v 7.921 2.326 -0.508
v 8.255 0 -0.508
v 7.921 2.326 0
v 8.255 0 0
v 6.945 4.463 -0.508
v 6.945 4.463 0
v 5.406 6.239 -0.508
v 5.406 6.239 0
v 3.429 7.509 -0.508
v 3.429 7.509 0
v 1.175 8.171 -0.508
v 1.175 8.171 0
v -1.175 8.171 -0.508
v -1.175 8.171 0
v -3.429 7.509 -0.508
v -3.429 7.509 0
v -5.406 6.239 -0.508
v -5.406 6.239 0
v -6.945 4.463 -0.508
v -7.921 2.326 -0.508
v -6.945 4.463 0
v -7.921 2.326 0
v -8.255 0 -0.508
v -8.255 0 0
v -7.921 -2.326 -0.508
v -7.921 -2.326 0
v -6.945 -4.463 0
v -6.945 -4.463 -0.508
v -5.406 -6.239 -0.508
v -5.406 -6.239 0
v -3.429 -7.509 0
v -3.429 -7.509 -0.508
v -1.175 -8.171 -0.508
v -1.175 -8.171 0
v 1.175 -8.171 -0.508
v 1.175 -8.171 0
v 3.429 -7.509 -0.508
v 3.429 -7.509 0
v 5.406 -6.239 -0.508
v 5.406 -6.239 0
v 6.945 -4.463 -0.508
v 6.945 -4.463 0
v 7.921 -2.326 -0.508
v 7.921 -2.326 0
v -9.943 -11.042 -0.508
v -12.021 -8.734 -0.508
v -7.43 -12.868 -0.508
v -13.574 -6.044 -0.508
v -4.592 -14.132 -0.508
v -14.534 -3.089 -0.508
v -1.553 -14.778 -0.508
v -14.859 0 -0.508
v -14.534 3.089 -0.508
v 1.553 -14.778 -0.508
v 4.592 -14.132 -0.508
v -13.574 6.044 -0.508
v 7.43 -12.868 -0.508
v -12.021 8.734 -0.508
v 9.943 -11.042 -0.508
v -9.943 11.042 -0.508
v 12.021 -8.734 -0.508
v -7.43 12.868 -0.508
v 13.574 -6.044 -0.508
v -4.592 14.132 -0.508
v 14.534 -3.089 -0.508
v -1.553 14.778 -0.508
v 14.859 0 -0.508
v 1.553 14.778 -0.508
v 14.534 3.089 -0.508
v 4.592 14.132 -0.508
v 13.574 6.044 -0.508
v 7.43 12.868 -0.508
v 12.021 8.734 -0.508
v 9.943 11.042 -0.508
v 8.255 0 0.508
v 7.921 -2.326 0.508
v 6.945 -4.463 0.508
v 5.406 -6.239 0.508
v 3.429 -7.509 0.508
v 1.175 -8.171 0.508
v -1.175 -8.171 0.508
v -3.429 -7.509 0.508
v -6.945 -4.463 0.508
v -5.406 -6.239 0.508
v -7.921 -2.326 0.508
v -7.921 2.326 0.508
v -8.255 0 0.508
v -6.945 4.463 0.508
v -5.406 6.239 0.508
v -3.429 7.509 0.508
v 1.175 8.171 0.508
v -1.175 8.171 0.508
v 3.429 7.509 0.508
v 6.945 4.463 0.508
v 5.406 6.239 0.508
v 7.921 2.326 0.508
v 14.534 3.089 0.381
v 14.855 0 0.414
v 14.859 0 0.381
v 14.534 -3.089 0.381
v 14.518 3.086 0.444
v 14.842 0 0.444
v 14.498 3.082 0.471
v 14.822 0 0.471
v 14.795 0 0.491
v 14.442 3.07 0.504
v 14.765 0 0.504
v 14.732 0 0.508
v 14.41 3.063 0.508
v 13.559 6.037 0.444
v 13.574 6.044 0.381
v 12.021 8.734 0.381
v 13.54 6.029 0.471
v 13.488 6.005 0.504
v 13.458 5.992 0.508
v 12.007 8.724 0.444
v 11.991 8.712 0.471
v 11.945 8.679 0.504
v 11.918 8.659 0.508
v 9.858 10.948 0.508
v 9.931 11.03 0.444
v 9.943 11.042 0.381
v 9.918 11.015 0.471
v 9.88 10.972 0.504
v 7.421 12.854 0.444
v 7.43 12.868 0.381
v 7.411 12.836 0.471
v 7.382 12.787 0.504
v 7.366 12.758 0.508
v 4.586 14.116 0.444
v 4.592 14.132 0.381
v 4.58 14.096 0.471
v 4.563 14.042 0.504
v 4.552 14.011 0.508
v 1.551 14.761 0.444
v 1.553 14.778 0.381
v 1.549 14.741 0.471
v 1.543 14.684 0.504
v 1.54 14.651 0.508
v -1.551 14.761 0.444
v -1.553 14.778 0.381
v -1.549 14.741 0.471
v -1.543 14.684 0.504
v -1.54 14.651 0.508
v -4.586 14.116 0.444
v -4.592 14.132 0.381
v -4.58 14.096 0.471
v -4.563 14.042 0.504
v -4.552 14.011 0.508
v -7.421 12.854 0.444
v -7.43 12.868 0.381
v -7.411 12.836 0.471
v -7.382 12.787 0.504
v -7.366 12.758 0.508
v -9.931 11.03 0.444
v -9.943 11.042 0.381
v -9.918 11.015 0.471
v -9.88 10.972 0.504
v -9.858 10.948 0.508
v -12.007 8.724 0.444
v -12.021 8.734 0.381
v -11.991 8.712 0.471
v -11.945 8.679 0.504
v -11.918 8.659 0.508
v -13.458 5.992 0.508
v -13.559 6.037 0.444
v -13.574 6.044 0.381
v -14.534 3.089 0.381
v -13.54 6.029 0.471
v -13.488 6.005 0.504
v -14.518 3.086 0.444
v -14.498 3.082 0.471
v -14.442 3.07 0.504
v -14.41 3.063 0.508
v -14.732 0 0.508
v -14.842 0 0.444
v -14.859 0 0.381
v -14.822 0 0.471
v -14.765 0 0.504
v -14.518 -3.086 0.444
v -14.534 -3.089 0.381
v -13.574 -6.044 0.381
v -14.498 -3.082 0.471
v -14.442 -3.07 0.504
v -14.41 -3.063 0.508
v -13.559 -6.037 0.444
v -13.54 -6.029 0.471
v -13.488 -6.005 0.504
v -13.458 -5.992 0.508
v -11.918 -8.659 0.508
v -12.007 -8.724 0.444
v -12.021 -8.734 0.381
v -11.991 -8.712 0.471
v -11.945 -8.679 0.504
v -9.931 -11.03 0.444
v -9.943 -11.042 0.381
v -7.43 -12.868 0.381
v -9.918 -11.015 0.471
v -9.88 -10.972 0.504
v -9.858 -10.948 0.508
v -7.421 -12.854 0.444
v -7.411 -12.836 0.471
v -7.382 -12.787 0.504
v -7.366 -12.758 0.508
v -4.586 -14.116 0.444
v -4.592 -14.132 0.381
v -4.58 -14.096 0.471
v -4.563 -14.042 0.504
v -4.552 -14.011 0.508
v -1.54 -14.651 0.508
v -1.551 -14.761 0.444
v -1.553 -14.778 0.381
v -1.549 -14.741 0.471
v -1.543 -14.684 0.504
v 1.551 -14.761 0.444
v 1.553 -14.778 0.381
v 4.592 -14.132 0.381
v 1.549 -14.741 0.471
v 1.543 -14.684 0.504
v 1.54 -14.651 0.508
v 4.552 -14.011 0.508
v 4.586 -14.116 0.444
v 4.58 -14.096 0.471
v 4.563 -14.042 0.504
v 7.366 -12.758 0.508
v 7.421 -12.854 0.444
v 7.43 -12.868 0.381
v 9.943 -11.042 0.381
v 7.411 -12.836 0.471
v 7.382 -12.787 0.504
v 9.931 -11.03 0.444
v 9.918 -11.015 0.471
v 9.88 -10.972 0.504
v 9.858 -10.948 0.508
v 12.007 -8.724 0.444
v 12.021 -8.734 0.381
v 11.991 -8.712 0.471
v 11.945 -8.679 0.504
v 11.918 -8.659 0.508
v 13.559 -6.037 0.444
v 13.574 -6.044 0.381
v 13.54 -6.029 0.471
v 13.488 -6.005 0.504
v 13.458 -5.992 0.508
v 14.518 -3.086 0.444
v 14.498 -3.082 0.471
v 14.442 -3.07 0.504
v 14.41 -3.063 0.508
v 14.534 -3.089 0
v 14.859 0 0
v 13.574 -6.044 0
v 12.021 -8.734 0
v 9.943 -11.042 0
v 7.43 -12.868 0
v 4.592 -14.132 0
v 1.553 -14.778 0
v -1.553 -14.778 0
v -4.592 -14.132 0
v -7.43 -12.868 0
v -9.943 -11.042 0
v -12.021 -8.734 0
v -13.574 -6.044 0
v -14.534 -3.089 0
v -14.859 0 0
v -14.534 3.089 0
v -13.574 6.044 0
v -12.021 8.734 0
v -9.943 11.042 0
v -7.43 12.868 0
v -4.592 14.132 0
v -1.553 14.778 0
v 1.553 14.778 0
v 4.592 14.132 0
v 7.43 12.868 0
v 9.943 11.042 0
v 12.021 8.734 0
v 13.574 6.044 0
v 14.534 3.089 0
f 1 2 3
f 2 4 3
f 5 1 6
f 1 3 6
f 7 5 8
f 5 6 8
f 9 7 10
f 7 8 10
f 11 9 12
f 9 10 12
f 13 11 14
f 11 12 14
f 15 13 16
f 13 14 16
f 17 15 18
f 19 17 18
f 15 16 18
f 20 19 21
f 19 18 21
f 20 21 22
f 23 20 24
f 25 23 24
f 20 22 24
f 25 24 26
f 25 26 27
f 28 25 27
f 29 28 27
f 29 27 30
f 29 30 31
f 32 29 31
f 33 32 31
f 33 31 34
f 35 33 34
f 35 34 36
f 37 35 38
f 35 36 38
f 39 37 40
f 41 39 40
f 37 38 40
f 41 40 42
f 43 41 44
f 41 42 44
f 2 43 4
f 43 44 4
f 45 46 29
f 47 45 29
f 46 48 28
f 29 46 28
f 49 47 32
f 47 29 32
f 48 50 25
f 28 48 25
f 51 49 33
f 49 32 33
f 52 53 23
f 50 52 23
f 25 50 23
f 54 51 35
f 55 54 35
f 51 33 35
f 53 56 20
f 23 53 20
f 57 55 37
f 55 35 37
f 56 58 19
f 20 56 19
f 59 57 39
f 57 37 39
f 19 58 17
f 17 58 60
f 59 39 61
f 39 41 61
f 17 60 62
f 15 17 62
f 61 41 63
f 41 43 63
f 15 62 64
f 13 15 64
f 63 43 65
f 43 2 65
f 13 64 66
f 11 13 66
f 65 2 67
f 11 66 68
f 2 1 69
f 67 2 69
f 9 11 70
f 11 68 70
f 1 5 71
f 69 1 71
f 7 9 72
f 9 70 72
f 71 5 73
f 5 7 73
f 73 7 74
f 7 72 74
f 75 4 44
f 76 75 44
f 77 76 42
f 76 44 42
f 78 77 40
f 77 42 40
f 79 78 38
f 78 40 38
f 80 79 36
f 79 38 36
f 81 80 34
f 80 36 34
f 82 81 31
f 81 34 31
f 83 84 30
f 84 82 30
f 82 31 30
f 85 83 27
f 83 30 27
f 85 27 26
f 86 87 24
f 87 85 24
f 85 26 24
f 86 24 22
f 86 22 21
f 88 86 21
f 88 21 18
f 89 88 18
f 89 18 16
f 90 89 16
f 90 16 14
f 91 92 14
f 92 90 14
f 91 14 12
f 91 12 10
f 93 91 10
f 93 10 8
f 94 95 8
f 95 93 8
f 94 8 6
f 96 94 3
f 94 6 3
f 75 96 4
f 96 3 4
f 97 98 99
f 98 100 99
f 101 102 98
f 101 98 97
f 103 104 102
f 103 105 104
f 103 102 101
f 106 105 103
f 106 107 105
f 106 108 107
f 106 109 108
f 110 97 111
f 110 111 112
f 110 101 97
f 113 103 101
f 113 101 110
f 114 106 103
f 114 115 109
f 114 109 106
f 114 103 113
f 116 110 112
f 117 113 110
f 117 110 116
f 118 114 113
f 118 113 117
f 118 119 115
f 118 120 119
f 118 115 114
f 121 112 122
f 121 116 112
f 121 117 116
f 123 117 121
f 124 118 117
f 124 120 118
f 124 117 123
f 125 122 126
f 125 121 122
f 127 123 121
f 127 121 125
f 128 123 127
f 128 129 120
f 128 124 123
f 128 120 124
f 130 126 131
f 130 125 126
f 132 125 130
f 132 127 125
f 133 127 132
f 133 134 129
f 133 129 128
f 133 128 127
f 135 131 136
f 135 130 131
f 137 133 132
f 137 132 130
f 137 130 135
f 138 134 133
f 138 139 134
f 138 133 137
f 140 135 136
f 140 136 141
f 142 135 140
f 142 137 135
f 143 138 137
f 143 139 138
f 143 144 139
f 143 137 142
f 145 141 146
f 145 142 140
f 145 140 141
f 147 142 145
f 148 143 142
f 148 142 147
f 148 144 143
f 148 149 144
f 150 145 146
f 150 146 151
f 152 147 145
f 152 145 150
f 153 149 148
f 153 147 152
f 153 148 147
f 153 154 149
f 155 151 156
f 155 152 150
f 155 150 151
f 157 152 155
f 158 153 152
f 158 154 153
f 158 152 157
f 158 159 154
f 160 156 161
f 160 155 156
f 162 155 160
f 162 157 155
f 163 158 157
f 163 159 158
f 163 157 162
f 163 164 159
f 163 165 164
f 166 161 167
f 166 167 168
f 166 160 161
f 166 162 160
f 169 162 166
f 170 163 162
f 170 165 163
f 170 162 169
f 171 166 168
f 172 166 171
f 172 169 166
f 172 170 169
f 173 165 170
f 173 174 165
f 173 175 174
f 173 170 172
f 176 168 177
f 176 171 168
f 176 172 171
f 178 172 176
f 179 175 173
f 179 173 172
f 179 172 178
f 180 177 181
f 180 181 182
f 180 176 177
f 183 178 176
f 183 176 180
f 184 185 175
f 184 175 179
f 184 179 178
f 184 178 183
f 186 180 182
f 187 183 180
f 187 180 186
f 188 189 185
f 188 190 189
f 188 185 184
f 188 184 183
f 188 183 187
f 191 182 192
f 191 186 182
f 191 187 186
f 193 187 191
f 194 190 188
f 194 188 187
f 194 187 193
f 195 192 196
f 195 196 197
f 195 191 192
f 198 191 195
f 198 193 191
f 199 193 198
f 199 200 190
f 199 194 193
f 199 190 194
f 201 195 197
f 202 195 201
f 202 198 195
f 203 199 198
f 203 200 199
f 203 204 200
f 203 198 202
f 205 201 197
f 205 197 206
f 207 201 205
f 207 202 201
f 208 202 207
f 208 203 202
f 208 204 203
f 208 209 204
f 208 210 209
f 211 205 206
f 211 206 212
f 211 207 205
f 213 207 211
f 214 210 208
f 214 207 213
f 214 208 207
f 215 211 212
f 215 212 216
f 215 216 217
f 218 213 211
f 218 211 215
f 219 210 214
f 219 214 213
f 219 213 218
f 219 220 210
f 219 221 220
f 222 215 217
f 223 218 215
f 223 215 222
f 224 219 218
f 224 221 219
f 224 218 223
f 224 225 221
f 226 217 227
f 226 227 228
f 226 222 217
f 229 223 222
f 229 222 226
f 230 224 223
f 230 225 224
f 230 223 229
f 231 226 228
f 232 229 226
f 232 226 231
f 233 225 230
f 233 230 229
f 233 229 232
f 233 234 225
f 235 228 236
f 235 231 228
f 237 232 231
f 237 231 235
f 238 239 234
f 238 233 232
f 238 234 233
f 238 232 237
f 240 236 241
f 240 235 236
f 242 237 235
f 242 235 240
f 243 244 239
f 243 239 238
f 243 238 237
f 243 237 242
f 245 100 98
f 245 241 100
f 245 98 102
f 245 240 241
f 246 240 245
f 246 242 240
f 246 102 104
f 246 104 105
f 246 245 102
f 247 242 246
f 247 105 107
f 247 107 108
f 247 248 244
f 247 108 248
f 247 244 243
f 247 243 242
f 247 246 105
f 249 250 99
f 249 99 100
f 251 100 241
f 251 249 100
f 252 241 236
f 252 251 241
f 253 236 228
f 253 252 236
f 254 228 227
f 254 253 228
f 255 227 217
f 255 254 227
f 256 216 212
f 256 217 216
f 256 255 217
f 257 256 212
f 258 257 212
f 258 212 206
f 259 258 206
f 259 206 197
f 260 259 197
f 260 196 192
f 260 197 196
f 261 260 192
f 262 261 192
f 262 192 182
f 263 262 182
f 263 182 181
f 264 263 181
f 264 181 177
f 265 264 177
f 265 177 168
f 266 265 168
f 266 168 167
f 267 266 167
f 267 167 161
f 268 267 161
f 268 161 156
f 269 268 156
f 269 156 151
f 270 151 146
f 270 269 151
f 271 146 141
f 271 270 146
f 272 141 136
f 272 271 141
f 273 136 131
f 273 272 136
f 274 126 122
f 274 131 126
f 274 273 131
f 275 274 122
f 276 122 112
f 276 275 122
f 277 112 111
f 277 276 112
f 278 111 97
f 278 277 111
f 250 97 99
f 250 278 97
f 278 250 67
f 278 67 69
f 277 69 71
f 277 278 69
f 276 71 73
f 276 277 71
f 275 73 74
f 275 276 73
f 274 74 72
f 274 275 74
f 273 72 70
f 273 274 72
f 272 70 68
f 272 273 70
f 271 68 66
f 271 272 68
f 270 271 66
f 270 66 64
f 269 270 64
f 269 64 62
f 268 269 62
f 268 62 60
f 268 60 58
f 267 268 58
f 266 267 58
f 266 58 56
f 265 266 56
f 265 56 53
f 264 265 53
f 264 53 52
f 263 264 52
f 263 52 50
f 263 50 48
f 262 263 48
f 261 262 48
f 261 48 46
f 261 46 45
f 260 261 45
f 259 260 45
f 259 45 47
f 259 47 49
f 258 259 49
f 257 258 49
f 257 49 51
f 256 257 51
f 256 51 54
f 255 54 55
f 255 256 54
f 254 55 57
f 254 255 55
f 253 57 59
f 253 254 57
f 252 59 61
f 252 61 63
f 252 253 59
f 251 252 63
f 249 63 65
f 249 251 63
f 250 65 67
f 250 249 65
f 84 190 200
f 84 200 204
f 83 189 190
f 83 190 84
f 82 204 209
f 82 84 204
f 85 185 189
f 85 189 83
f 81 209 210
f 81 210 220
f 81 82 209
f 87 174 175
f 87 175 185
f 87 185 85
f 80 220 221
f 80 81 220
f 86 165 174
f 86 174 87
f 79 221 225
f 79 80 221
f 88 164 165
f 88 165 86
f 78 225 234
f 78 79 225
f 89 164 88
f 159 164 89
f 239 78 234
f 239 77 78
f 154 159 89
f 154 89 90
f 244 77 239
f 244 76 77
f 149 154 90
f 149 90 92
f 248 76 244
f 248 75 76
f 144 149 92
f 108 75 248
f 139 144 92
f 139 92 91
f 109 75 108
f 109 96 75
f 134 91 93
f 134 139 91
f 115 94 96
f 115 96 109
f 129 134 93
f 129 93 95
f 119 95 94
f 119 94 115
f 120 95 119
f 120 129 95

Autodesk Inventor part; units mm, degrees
ref_plane "YZ Plane" through (0, 0, 0) normal (1, 0, 0) x (0, 1, 0)
ref_plane "XZ Plane" through (0, 0, 0) normal (0, 1, 0) x (-1, 0, 0)
ref_plane "XY Plane" through (0, 0, 0) normal (0, 0, 1) x (1, 0, 0)
sketch "Sketch1" plane through (0, 0, 0) normal (0, 0, 1) x (1, 0, 0)
  circle A0 centre (0, 0) radius 8.255
  circle A1 centre (0, 0) radius 14.859
  dimension "d0" = 16.51
  dimension "d1" = 29.718
extrude "Extrusion1" add sketch "Sketch1" along normal mid plane 1.016
fillet "Fillet1" radius 0.127 1 edges at (-14.859, 0, 0.508)
properties part number "Large Washer" material "Stainless Steel"
